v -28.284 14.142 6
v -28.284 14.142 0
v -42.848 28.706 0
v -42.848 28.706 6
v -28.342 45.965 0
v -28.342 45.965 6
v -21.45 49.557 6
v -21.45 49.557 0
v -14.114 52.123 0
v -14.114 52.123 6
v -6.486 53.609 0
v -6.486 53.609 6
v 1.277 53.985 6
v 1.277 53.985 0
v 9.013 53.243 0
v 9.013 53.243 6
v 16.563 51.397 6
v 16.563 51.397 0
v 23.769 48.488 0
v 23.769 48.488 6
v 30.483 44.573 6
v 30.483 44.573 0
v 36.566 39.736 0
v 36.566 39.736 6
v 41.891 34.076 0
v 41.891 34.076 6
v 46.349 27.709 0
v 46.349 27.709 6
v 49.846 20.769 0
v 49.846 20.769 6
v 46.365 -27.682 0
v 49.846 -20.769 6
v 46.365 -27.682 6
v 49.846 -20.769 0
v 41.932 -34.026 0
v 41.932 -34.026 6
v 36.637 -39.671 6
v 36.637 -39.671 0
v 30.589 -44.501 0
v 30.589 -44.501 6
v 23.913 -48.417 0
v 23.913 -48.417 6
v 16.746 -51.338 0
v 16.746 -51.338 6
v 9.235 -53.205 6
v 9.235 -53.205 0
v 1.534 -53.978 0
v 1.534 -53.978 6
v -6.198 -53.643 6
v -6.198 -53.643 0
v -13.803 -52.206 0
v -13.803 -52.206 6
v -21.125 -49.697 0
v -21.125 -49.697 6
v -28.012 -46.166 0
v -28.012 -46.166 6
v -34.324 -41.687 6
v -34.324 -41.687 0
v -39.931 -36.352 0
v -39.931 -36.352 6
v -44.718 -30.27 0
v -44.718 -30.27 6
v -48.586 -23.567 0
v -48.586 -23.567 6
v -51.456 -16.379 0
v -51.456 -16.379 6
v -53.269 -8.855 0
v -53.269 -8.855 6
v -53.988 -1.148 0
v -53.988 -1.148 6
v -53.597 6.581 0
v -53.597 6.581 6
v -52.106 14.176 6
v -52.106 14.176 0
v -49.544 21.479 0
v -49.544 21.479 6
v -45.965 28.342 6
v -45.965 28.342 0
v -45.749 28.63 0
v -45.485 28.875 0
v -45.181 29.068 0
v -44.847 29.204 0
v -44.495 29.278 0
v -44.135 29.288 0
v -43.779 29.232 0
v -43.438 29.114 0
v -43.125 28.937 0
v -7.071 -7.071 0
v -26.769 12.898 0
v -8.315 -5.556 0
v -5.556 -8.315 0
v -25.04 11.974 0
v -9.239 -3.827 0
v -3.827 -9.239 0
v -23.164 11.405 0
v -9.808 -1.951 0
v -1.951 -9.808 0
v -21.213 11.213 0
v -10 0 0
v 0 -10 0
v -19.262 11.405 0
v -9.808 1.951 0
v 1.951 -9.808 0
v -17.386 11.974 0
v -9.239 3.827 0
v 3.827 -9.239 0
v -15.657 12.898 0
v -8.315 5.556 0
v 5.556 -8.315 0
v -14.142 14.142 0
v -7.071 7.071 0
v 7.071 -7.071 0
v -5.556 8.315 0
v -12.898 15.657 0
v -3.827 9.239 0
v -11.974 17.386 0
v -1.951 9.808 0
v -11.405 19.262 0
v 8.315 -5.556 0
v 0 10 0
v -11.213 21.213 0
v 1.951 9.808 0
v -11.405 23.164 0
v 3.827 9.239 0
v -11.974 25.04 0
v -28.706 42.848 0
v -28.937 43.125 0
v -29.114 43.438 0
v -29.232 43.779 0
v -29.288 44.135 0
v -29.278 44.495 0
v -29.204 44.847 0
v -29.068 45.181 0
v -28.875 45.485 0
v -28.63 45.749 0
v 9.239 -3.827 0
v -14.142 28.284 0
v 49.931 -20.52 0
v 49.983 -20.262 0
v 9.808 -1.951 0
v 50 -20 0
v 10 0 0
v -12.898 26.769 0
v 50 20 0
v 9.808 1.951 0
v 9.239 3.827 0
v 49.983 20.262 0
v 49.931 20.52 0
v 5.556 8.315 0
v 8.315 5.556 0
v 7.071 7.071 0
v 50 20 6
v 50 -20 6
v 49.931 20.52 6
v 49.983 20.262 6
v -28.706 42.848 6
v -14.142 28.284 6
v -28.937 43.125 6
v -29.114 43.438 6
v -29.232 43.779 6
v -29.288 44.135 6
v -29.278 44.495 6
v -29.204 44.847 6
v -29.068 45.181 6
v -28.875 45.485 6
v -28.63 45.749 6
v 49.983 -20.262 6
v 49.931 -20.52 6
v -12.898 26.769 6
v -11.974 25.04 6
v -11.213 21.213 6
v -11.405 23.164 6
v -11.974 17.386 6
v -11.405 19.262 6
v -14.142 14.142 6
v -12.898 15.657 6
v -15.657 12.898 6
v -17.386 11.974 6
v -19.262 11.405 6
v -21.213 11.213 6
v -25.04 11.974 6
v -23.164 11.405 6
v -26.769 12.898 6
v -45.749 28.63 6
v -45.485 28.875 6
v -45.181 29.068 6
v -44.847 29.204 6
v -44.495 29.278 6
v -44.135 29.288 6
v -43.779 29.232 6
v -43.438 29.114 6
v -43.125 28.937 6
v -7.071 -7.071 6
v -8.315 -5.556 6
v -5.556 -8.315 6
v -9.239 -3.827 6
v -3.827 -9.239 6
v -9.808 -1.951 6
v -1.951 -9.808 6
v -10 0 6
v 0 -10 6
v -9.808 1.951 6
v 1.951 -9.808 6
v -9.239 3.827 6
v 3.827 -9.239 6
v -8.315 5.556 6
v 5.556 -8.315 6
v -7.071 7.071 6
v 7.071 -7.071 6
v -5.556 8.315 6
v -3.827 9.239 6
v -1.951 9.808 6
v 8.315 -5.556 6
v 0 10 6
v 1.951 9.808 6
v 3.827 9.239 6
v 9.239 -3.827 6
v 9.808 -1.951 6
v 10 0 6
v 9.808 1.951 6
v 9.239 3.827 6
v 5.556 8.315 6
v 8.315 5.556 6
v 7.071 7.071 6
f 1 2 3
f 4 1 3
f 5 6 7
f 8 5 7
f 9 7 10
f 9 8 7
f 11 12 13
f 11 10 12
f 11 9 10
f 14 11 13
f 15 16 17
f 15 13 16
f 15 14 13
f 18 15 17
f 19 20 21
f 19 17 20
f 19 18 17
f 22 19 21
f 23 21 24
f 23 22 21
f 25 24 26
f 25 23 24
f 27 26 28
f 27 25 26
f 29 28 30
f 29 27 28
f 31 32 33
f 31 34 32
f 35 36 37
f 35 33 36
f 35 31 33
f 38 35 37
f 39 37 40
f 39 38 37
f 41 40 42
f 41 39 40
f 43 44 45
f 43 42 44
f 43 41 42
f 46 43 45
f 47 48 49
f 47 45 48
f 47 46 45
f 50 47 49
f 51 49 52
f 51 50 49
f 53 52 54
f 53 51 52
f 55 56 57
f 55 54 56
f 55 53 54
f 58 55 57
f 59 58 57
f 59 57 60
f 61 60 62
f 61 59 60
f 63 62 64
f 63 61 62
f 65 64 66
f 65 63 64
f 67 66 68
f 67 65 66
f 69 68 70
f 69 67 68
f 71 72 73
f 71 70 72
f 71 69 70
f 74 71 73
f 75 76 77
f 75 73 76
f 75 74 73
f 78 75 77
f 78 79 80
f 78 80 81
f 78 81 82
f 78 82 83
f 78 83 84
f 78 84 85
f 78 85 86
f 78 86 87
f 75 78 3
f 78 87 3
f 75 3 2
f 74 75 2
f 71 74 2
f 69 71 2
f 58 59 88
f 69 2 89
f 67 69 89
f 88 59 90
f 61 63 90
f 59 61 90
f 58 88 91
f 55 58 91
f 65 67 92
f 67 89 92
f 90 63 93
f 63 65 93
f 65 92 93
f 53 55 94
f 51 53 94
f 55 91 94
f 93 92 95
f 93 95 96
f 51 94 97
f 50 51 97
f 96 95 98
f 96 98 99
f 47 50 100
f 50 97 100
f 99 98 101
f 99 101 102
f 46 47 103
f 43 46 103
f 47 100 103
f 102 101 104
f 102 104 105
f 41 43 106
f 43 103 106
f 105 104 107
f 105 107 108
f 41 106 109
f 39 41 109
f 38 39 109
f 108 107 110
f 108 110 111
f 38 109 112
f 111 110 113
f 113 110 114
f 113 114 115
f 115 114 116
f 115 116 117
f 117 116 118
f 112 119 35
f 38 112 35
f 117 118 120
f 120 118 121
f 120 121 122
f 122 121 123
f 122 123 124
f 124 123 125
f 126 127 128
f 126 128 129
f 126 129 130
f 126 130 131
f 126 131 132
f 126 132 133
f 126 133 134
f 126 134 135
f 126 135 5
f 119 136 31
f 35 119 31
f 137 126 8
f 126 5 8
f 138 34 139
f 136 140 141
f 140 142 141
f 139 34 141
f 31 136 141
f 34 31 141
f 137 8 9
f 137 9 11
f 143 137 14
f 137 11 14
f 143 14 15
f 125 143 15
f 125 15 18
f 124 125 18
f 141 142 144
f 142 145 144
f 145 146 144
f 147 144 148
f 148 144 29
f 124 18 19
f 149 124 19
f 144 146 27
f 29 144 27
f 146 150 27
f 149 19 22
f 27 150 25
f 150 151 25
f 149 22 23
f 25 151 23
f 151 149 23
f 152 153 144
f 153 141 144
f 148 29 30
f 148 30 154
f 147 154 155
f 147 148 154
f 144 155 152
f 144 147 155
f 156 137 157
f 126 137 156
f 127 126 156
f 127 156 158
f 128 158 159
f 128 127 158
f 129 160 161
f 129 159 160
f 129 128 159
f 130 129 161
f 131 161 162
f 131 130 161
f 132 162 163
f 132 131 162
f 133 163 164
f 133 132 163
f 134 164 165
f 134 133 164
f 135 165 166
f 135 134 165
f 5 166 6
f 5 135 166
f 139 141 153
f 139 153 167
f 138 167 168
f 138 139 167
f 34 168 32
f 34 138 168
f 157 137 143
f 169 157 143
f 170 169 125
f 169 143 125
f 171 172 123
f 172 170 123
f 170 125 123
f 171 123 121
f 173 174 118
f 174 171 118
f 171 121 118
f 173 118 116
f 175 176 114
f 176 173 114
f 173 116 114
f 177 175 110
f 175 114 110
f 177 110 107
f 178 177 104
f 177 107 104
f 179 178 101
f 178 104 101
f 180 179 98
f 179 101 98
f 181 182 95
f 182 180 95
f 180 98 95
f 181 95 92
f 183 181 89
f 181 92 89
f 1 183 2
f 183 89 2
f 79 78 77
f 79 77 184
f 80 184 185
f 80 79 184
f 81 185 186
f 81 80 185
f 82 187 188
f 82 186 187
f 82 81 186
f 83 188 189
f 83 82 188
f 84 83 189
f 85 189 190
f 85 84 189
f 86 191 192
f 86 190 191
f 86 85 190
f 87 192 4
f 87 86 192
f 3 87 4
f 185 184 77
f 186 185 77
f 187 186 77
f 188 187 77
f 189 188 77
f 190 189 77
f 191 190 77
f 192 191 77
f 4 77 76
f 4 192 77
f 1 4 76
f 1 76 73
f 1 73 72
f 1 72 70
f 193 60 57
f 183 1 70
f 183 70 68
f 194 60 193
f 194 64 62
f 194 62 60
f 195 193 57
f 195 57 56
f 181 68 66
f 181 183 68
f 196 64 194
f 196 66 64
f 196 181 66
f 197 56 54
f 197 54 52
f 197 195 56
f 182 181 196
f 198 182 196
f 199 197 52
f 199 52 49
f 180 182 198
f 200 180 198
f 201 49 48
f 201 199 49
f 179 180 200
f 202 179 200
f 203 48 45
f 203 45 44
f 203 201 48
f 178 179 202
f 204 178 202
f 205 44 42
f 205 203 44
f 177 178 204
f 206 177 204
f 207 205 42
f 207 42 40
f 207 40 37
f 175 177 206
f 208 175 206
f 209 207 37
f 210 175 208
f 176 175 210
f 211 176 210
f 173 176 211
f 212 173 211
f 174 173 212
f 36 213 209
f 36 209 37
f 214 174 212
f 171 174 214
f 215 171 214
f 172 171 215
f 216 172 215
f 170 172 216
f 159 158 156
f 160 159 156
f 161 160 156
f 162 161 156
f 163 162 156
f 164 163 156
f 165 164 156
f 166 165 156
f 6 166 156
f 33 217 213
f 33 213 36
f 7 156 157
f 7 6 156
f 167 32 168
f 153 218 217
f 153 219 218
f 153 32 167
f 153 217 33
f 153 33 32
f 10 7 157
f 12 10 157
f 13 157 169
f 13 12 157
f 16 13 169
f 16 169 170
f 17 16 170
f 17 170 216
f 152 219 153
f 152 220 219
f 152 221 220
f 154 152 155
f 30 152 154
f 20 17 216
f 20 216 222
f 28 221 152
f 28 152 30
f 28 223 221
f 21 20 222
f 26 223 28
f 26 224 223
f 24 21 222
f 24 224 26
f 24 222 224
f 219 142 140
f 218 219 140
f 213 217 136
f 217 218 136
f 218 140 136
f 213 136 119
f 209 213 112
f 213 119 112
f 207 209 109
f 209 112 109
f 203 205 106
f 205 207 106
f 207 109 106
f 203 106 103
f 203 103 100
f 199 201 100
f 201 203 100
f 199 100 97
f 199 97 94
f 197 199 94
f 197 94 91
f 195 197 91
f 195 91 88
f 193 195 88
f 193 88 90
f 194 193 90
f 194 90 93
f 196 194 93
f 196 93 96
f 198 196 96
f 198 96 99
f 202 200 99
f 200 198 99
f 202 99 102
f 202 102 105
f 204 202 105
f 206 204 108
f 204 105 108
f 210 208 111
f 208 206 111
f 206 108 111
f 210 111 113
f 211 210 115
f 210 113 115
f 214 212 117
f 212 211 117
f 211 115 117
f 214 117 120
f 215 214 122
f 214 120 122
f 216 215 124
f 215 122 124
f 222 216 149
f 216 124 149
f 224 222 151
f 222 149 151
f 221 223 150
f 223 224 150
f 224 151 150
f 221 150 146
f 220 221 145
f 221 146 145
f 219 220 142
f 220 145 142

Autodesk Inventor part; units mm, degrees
ref_plane "YZ Plane" through (0, 0, 0) normal (1, 0, 0) x (0, 1, 0)
ref_plane "XZ Plane" through (0, 0, 0) normal (0, 1, 0) x (-1, 0, 0)
ref_plane "XY Plane" through (0, 0, 0) normal (0, 0, 1) x (1, 0, 0)
sketch "Sketch1" plane through (0, 0, 0) normal (0, 0, 1) x (1, 0, 0)
  circle A0 centre (0, 0) radius 10
  arc A1 (-28.2843, 14.1421) -> (-14.1421, 28.2843) centre (-21.2132, 21.2132) ccw
  line L0 (-14.1421, 28.2843) -> (-28.706, 42.8482)
  line L1 (-28.2843, 14.1421) -> (-42.8482, 28.706)
  line L2 (50, -20) -> (50, 20)
  arc A2 (-45.9648, 28.3415) -> (49.8462, -20.7692) centre (0, 0) ccw
  arc A3 (49.8462, 20.7692) -> (-28.3415, 45.9648) centre (0, 0) ccw
  arc A4 (-42.8482, 28.706) -> (-45.9648, 28.3415) centre (-44.2624, 27.2918) ccw
  arc A5 (-28.3415, 45.9648) -> (-28.706, 42.8482) centre (-27.2918, 44.2624) ccw
  arc A6 (50, 20) -> (49.8462, 20.7692) centre (48, 20) ccw
  arc A7 (49.8462, -20.7692) -> (50, -20) centre (48, -20) ccw
  line L3 (0, 0) -> (-40.4458, 40.4458) construction
  point P0 (-30.4523, 44.5944)
  point P1 (-44.5944, 30.4523)
  point P2 (50, -20.3961)
  point P3 (50, 20.3961)
  dimension "d1" = 20
  dimension "d4" = 20
  dimension "d12" = 50
  dimension "d13" = 2
  dimension "d14" = 54
  dimension "d15" = 54
  dimension "d16" = 20
  dimension "d19" = 45
  dimension "d21" = 10
  dimension "d22" = 30
extrude "Extrusion3" add sketch "Sketch1" along normal blind 6
properties part number "EndCap 108"
